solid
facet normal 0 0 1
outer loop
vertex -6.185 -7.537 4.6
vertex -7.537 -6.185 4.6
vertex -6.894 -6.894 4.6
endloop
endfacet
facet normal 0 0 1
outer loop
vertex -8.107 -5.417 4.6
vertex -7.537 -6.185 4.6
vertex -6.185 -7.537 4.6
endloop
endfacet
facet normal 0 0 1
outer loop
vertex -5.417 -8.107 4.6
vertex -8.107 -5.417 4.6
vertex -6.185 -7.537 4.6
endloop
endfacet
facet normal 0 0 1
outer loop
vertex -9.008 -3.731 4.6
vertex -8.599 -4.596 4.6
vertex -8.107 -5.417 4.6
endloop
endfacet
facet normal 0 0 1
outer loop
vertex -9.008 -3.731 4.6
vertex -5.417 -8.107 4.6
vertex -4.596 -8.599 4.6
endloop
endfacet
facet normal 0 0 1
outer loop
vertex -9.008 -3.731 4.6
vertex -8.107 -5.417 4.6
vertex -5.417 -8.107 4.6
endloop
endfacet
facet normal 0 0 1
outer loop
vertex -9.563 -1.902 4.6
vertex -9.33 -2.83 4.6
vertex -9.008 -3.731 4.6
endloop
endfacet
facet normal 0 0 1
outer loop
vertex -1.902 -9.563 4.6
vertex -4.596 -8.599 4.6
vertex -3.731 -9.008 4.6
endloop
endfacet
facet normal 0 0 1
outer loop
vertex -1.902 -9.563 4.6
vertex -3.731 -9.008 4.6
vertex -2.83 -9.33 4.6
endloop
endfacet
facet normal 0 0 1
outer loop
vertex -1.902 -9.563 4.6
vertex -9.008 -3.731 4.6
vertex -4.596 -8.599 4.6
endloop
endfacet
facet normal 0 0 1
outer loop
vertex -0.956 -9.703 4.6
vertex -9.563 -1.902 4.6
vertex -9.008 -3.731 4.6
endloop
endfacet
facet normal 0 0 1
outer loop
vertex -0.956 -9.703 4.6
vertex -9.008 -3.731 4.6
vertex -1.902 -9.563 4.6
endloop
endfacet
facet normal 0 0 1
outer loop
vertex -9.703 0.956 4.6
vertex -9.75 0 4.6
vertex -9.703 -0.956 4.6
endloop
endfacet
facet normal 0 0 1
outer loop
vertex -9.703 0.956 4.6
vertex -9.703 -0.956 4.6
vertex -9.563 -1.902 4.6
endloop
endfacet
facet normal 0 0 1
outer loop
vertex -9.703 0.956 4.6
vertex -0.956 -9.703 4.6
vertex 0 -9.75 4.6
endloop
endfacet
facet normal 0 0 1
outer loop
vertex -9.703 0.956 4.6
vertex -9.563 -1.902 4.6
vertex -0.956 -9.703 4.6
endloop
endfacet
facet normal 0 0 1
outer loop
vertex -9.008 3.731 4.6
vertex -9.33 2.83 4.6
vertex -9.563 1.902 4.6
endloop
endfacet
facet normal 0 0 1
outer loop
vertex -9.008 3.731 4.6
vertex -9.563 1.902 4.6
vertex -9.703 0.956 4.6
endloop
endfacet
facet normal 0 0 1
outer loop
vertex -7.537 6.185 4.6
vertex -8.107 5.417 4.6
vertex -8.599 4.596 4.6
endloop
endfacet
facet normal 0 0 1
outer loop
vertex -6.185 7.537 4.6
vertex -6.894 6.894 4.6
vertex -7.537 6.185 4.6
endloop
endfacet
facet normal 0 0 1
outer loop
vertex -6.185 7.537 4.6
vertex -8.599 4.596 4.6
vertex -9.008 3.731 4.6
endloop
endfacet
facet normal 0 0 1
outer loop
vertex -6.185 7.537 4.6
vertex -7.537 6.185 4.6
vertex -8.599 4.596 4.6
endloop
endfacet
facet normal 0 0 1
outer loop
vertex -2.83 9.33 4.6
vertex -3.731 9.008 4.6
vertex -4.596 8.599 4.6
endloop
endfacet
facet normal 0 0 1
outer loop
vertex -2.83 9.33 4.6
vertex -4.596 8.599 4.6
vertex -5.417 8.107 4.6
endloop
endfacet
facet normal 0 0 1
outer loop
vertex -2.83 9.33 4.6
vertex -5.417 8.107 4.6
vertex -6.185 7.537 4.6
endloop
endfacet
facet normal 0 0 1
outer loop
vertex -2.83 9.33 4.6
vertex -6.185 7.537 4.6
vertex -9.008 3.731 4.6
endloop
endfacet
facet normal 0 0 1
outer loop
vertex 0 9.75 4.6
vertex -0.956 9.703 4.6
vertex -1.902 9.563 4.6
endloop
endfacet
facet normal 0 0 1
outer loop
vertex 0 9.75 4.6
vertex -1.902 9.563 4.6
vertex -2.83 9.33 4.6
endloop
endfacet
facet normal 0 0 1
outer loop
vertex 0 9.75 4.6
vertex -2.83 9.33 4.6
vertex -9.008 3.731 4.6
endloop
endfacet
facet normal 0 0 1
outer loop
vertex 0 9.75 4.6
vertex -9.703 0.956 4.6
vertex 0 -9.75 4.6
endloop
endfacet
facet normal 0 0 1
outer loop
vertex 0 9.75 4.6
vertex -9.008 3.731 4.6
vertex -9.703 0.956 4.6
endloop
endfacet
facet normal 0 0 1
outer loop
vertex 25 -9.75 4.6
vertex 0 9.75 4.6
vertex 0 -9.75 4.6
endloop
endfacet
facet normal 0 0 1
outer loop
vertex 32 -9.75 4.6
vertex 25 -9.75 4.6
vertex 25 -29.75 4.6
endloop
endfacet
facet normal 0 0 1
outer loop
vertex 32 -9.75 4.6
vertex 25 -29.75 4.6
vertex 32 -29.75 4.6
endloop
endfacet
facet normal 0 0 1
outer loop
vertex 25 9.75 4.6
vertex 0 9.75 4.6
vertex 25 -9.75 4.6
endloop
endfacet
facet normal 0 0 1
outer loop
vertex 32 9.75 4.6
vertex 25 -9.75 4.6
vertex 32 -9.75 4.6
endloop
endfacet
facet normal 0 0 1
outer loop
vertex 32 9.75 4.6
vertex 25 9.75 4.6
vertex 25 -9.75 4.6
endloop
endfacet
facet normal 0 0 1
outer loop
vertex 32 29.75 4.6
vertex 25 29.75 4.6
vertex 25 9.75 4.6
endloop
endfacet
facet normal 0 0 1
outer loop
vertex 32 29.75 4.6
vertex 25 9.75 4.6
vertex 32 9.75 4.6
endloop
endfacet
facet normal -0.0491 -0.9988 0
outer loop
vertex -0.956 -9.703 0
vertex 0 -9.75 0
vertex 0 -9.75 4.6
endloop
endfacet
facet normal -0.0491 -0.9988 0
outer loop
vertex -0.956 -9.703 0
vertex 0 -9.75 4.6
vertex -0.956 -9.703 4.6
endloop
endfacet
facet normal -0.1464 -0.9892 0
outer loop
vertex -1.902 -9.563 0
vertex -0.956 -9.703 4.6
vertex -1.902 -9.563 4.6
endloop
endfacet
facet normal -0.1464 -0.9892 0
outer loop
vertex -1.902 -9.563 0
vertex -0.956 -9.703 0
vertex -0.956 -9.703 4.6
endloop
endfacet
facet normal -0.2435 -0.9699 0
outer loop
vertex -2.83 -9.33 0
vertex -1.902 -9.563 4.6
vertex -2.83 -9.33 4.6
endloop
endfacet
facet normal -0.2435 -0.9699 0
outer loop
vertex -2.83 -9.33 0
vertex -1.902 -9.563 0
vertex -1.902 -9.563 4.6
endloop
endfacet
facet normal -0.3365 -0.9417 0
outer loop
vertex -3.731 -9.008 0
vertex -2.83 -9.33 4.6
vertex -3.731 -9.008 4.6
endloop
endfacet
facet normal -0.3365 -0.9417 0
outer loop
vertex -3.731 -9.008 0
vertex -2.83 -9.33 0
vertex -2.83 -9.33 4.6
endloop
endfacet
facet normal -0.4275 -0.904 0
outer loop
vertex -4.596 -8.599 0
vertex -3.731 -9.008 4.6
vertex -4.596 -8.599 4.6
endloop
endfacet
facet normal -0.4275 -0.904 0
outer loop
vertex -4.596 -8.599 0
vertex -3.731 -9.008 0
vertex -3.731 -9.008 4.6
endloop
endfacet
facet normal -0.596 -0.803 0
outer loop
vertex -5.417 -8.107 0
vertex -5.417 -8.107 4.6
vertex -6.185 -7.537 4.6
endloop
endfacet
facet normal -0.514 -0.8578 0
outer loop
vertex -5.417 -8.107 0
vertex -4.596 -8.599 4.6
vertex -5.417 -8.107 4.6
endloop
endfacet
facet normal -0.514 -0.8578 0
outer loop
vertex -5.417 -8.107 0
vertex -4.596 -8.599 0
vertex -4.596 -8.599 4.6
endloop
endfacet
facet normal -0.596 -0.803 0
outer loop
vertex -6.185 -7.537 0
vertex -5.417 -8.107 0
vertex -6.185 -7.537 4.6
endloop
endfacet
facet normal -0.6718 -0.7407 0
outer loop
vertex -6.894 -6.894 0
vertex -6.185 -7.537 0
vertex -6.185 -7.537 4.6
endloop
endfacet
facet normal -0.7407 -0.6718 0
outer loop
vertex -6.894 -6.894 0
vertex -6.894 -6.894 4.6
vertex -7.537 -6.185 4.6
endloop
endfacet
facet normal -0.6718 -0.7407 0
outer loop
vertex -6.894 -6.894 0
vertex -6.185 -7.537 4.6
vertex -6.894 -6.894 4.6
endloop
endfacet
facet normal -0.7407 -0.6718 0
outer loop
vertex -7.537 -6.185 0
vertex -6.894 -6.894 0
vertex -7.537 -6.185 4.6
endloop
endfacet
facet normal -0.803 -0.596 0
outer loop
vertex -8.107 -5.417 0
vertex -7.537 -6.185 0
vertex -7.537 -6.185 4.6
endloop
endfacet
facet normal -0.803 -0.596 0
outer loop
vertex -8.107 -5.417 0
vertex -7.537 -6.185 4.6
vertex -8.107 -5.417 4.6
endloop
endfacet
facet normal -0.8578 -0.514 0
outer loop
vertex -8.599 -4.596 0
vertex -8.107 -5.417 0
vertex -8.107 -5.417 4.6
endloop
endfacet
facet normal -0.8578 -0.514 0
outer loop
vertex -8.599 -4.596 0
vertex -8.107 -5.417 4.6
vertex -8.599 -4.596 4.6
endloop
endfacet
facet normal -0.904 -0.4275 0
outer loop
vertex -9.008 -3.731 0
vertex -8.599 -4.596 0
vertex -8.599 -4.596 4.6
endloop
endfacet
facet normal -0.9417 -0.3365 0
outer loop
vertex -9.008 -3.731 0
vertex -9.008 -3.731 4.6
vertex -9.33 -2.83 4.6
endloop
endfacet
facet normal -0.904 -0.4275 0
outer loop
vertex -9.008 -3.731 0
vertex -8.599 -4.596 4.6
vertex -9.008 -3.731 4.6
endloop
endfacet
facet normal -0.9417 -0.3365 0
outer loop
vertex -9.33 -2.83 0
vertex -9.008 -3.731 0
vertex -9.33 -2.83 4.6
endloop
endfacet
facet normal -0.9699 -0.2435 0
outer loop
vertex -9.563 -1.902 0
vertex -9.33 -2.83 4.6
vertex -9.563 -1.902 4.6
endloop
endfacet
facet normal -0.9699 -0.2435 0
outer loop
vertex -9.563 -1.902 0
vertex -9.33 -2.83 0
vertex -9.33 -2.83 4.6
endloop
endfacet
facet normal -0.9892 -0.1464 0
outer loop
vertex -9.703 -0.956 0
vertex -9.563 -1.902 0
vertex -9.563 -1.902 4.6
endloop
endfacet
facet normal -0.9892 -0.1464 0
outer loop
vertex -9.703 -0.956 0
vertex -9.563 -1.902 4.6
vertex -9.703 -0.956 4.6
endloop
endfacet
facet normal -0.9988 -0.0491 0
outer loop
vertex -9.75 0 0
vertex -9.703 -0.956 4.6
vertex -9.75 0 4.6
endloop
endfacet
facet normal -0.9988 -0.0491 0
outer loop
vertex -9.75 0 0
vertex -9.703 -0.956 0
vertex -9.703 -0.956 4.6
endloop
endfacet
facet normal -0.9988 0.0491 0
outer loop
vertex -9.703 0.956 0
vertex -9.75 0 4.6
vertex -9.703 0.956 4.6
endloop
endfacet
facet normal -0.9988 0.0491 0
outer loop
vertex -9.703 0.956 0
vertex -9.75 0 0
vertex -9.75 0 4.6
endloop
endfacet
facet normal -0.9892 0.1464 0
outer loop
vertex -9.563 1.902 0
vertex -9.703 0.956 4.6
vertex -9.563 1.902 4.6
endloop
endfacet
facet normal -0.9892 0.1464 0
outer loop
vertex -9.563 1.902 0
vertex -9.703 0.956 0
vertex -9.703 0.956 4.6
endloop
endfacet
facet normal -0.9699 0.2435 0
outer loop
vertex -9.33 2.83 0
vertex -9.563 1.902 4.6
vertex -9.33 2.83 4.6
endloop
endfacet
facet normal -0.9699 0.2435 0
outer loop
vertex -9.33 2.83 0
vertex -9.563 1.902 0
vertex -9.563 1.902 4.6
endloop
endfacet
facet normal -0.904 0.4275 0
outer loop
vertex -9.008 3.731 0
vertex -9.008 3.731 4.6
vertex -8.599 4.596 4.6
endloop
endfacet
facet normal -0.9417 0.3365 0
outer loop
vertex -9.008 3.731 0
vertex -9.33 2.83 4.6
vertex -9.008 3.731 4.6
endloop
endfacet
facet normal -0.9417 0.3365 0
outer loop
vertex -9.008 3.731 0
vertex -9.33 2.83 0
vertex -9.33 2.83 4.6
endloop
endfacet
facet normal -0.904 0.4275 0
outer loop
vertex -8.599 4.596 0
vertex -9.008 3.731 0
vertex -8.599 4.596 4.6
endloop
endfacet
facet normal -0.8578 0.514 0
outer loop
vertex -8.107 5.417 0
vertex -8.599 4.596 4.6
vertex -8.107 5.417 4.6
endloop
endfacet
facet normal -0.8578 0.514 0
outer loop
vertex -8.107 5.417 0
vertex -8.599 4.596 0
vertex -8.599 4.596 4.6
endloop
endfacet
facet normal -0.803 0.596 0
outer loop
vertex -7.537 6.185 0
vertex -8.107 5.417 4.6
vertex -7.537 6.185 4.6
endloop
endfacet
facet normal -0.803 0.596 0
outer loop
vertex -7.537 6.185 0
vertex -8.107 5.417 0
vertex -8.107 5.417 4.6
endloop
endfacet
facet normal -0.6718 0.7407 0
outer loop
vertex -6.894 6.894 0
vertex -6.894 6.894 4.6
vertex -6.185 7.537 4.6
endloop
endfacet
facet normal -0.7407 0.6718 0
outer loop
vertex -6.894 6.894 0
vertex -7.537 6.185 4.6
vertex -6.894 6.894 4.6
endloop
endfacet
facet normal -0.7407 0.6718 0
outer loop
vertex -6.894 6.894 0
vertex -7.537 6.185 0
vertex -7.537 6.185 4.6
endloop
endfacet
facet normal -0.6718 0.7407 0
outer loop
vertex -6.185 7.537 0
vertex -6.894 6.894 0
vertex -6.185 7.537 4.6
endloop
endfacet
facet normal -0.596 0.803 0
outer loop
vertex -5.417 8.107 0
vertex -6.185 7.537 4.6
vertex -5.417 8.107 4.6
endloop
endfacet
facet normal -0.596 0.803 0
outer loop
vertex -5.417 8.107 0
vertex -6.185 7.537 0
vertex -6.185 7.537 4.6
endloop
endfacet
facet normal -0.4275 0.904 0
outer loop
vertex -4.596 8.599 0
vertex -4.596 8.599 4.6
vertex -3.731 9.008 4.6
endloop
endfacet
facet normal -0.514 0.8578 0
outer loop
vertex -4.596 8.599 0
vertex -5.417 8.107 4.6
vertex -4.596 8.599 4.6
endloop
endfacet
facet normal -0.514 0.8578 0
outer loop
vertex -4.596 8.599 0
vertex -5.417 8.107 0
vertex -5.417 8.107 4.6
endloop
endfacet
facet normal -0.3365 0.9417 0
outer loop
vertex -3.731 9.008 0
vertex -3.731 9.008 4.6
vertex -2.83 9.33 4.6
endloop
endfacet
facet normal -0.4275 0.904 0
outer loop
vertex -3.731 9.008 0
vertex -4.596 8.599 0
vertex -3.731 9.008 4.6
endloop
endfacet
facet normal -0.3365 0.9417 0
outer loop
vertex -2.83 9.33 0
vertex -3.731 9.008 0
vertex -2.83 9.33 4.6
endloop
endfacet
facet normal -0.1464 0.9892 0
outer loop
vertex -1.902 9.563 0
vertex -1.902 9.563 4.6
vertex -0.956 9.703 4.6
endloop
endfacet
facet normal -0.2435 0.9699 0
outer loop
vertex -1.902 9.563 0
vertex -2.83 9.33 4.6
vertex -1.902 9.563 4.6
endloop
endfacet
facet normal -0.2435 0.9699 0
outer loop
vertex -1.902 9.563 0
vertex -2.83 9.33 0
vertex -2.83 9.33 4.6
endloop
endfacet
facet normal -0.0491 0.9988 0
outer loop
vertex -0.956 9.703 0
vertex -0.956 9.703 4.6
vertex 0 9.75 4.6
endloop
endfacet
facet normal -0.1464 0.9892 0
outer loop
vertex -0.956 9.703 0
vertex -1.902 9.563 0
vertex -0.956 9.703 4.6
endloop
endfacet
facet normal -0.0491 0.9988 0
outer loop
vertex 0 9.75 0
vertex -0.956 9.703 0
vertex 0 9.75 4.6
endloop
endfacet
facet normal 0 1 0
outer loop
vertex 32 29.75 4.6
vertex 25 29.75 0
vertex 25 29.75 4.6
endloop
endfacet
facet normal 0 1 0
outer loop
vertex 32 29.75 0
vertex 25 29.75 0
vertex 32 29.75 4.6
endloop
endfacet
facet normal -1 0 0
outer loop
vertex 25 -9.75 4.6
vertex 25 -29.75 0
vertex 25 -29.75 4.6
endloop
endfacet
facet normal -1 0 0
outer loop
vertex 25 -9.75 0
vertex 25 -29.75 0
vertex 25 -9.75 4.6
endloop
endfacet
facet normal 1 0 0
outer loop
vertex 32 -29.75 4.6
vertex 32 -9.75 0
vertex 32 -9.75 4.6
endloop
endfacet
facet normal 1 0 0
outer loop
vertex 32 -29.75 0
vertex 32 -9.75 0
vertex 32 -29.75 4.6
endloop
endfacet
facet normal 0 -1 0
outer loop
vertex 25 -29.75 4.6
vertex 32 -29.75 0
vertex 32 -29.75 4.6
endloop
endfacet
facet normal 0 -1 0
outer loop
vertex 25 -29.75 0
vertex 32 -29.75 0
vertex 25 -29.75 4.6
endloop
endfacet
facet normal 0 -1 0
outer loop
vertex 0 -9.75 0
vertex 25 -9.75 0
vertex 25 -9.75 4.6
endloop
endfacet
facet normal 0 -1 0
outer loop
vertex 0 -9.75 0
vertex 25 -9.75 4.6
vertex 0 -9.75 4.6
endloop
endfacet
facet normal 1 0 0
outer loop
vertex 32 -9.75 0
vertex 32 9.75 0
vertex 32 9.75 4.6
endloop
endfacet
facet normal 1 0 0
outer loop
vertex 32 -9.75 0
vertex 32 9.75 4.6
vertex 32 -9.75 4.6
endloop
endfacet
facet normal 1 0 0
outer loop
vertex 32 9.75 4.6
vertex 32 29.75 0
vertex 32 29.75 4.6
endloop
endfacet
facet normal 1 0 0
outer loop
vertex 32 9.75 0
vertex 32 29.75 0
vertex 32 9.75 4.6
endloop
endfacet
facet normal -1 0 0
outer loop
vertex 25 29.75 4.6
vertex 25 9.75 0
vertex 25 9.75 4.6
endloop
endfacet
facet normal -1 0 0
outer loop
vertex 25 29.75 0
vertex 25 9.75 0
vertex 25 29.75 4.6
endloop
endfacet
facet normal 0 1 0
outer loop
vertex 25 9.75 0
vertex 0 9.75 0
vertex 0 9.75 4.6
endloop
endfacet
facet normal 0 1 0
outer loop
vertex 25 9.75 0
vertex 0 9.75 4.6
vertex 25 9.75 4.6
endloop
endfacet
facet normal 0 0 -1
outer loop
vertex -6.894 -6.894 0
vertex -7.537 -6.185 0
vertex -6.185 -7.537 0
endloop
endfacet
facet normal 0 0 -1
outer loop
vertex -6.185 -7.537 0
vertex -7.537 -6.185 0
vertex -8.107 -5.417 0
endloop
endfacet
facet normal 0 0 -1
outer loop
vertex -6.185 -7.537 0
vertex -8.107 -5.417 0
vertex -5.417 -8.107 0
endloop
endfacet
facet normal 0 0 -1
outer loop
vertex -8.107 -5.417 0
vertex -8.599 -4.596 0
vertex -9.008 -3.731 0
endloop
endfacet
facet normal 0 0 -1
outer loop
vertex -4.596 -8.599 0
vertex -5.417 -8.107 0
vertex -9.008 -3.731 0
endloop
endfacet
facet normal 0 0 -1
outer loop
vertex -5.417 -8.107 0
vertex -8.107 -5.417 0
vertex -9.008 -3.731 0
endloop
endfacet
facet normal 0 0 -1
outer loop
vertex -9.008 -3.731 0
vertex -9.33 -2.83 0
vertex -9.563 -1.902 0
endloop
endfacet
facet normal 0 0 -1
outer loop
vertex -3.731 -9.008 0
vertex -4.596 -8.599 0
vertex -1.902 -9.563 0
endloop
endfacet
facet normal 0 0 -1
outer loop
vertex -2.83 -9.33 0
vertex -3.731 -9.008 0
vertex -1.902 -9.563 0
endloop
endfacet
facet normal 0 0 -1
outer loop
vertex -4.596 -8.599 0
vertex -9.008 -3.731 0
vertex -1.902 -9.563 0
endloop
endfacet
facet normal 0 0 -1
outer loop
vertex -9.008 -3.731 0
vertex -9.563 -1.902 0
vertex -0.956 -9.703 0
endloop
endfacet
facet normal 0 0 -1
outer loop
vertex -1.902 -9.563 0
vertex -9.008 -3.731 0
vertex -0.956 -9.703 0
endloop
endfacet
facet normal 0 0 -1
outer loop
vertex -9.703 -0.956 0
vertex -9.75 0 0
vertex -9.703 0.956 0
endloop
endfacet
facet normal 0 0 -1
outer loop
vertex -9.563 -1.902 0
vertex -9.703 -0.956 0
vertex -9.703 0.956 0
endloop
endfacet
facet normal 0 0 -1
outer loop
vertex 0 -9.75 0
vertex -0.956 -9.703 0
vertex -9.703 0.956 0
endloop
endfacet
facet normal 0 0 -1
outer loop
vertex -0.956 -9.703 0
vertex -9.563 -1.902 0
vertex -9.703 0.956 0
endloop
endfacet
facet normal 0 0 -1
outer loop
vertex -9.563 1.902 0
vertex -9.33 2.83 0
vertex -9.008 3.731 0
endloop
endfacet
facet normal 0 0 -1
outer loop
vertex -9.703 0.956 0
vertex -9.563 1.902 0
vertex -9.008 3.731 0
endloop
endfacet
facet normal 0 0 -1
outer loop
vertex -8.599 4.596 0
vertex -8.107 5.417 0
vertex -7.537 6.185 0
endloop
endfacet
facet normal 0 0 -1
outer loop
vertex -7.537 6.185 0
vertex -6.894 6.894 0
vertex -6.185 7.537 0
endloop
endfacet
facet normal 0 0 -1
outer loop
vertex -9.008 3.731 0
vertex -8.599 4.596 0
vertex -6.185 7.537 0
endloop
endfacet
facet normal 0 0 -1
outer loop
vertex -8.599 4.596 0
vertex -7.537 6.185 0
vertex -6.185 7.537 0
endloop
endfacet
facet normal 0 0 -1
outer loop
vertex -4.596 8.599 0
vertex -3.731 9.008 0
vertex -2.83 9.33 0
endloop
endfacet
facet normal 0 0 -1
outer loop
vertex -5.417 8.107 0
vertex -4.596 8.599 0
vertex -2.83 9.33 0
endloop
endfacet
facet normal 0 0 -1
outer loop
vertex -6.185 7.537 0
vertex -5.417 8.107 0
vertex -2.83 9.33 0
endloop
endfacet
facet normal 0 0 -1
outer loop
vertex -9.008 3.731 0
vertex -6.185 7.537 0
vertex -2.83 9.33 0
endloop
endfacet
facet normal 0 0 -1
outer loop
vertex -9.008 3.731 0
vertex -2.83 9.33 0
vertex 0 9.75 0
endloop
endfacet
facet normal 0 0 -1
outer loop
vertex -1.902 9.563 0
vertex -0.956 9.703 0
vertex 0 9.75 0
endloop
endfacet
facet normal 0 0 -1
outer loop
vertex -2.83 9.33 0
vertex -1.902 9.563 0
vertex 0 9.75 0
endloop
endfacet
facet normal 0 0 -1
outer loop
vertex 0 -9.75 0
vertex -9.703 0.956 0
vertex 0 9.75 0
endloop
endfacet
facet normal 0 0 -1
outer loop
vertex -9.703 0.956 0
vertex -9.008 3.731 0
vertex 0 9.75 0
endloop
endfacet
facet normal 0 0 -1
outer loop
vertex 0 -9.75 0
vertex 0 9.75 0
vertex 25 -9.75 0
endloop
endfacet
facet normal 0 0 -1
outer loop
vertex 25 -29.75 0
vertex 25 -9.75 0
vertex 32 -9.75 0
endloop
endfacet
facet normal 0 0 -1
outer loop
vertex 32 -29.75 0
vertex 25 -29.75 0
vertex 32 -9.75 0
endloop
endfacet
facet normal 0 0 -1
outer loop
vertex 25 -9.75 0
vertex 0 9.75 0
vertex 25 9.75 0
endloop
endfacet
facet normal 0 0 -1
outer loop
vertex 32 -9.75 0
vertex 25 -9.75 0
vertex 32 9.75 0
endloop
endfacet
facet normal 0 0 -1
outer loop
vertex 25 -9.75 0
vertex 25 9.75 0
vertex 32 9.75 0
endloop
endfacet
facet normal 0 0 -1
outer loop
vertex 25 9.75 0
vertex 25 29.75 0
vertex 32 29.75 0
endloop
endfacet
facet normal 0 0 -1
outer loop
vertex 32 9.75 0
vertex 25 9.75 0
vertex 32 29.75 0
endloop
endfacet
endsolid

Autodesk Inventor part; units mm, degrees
ref_plane "YZ Plane" through (0, 0, 0) normal (1, 0, 0) x (0, 1, 0)
ref_plane "XZ Plane" through (0, 0, 0) normal (0, 1, 0) x (-1, 0, 0)
ref_plane "XY Plane" through (0, 0, 0) normal (0, 0, 1) x (1, 0, 0)
sketch "Sketch1" plane through (0, 0, 0) normal (0, 0, 1) x (1, 0, 0)
  arc A0 (0, 9.75) -> (0, -9.75) centre (0, 0) ccw
  line L0 (0, 9.75) -> (25, 9.75)
  line L1 (25, -9.75) -> (0, -9.75)
  line L2 (25, 9.75) -> (25, 29.75)
  line L3 (25, 29.75) -> (32, 29.75)
  line L4 (32, 29.75) -> (32, 9.75)
  line L5 (32, 9.75) -> (32, -9.75)
  line L6 (32, -9.75) -> (32, -29.75)
  line L7 (32, -29.75) -> (25, -29.75)
  line L8 (25, -29.75) -> (25, -9.75)
  dimension "d0" = 19.5
  dimension "d1" = 25
  dimension "d4" = 20
  dimension "d5" = 7
  dimension "d6" = 20
  dimension "d7" = 59.5
  dimension "d8" = 20
extrude "Extrusion1" add sketch "Sketch1" along normal blind 4.6
properties part number "Air Restricter 1.1"
